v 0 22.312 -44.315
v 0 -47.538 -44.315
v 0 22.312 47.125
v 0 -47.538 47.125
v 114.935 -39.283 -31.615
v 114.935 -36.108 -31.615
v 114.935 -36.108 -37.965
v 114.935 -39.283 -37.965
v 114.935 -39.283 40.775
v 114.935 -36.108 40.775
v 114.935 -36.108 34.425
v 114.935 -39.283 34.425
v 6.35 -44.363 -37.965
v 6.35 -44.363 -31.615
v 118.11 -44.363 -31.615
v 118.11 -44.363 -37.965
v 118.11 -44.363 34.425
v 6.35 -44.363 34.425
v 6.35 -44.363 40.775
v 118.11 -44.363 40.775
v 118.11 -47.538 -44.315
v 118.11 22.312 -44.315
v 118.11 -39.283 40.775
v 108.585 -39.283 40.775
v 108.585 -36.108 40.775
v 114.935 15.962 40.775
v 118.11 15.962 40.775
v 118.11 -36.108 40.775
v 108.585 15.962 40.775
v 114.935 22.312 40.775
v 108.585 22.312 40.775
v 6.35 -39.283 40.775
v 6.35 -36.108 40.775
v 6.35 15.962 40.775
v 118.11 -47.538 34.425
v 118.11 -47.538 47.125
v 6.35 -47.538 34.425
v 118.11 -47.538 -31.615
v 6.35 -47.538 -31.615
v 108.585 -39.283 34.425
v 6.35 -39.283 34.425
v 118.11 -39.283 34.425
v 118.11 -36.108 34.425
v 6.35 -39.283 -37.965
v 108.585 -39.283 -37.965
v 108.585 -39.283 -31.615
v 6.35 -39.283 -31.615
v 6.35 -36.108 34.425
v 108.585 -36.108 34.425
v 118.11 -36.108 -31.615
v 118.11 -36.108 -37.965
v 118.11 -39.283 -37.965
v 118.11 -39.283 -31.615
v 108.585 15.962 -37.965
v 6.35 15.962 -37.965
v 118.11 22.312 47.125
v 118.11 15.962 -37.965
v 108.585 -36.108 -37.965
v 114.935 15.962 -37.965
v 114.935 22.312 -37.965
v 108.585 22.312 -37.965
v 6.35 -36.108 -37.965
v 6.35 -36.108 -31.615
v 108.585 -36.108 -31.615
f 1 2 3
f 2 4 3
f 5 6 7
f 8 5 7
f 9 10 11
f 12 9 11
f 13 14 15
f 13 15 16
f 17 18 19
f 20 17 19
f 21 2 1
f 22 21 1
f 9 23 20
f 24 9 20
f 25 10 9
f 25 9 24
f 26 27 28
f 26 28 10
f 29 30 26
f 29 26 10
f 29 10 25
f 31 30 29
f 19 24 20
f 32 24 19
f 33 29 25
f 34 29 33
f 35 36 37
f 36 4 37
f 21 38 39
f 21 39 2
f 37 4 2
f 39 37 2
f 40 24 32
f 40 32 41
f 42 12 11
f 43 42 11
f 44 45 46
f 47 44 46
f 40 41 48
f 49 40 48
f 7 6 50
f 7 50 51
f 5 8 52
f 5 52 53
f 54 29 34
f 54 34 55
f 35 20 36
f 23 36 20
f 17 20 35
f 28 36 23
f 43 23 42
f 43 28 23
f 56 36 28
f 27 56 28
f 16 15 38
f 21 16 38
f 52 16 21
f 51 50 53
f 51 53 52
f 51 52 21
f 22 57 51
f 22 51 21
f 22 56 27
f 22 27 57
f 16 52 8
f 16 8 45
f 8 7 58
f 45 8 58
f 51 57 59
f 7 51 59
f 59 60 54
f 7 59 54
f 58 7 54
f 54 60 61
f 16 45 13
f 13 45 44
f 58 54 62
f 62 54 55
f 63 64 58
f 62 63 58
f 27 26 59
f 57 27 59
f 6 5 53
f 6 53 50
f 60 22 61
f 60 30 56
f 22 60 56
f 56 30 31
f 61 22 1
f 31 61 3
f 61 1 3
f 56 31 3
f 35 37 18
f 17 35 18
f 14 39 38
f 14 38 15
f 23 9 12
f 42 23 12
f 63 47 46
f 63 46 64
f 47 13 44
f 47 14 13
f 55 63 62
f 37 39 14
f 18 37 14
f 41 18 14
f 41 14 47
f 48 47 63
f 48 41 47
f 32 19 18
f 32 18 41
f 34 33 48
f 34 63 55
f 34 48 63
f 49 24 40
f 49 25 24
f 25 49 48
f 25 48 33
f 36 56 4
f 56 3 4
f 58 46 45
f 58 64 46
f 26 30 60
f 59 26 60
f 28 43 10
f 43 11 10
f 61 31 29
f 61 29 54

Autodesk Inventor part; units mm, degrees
ref_plane "YZ Plane" through (0, 0, 0) normal (1, 0, 0) x (0, 1, 0)
ref_plane "XZ Plane" through (0, 0, 0) normal (0, 1, 0) x (-1, 0, 0)
ref_plane "XY Plane" through (0, 0, 0) normal (0, 0, 1) x (1, 0, 0)
sketch "Sketch1" plane through (0, 0, 0) normal (1, 0, 0) x (0, 1, 0)
  point P0 (0, 0)
sketch "Sketch2" plane through (0, 0, 0) normal (1, 0, 0) x (0, 1, 0)
  line L0 (22.3119, 47.1251) -> (-47.5381, 47.1251)
  line L1 (-47.5381, 47.1251) -> (-47.5381, -44.3149)
  line L2 (-47.5381, -44.3149) -> (22.3119, -44.3149)
  line L3 (22.3119, -44.3149) -> (22.3119, 47.1251)
  point P0 (0, 0)
  dimension "d0" = 91.44
  dimension "d1" = 69.85
extrude "Extrusion1" add sketch "Sketch2" along normal blind 6.35
sketch "Sketch3" plane through (6.35, 0, 0) normal (1, 0, 0) x (0, 0, -1)
  line L0 (-47.1251, 22.3119) -> (-47.1251, -47.5381) projected
  line L1 (-47.1251, -47.5381) -> (-47.1251, 22.3119)
  line L2 (44.3149, -47.5381) -> (44.3149, 22.3119) projected
  line L3 (-47.1251, 22.3119) -> (44.3149, 22.3119)
  line L4 (44.3149, 22.3119) -> (44.3149, -47.5381)
  line L5 (-47.1251, -47.5381) -> (-40.7751, -47.5381)
  line L6 (-47.1251, -47.5381) -> (44.3149, -47.5381) projected
  line L7 (37.9649, -47.5381) -> (44.3149, -47.5381)
  line L8 (-40.7751, -47.5381) -> (-34.4251, -47.5381)
  line L9 (37.9649, -47.5381) -> (31.6149, -47.5381)
  line L10 (31.6149, -47.5381) -> (31.6149, -44.3631)
  line L11 (31.6149, -44.3631) -> (37.9649, -44.3631)
  line L12 (-34.4251, -47.5381) -> (-34.4251, -44.3631)
  line L13 (-34.4251, -44.3631) -> (-40.7751, -44.3631)
  line L14 (-40.7751, 15.9619) -> (37.9649, 15.9619)
  line L15 (-40.7751, -33.5681) -> (-40.7751, 15.9619)
  line L16 (37.9649, 15.9619) -> (37.9649, -33.5681)
  line L17 (-40.7751, -44.3631) -> (-40.7751, -39.2831)
  line L18 (-40.7751, -39.2831) -> (-34.4251, -39.2831)
  line L19 (-34.4251, -39.2831) -> (-34.4251, -36.1081)
  line L20 (-34.4251, -36.1081) -> (-40.7751, -36.1081)
  line L21 (-40.7751, -36.1081) -> (-40.7751, -33.5681)
  line L22 (37.9649, -44.3631) -> (37.9649, -39.2831)
  line L23 (37.9649, -39.2831) -> (31.6149, -39.2831)
  line L24 (31.6149, -39.2831) -> (31.6149, -36.1081)
  line L25 (31.6149, -36.1081) -> (37.9649, -36.1081)
  line L26 (37.9649, -36.1081) -> (37.9649, -33.5681)
  point P0 (0, 0)
  dimension "d7" = 78.74
  dimension "d10" = 6.35
  dimension "d11" = 3.175
  dimension "d25" = 3.175
  dimension "d26" = 5.08
  dimension "d27" = 5.08
  dimension "d28" = 3.175
  dimension "d29" = 3.175
  dimension "d30" = 6.35
  dimension "d31" = 66.04
extrude "Extrusion2" add sketch "Sketch3" along normal blind 111.76 contours L3 L2 L6 L10 L11 L22 L23 L24 L25 L26 L16 L14 L15 L21 L20 L19 L18 L17 L13 L12 L5 L0
sketch "Sketch4" plane through (0, 22.3119, 47.1251) normal (0, 1, 0) x (1, 0, 0)
  line L0 (114.935, 6.35) -> (114.935, 85.09)
  line L1 (114.935, 6.35) -> (108.585, 6.35)
  line L2 (108.585, 6.35) -> (108.585, 85.09)
  line L3 (114.935, 85.09) -> (108.585, 85.09)
  point P0 (0, 47.1251)
extrude "Extrusion3" cut sketch "Sketch4" against normal blind 63.5
properties part number "bens capstone"
